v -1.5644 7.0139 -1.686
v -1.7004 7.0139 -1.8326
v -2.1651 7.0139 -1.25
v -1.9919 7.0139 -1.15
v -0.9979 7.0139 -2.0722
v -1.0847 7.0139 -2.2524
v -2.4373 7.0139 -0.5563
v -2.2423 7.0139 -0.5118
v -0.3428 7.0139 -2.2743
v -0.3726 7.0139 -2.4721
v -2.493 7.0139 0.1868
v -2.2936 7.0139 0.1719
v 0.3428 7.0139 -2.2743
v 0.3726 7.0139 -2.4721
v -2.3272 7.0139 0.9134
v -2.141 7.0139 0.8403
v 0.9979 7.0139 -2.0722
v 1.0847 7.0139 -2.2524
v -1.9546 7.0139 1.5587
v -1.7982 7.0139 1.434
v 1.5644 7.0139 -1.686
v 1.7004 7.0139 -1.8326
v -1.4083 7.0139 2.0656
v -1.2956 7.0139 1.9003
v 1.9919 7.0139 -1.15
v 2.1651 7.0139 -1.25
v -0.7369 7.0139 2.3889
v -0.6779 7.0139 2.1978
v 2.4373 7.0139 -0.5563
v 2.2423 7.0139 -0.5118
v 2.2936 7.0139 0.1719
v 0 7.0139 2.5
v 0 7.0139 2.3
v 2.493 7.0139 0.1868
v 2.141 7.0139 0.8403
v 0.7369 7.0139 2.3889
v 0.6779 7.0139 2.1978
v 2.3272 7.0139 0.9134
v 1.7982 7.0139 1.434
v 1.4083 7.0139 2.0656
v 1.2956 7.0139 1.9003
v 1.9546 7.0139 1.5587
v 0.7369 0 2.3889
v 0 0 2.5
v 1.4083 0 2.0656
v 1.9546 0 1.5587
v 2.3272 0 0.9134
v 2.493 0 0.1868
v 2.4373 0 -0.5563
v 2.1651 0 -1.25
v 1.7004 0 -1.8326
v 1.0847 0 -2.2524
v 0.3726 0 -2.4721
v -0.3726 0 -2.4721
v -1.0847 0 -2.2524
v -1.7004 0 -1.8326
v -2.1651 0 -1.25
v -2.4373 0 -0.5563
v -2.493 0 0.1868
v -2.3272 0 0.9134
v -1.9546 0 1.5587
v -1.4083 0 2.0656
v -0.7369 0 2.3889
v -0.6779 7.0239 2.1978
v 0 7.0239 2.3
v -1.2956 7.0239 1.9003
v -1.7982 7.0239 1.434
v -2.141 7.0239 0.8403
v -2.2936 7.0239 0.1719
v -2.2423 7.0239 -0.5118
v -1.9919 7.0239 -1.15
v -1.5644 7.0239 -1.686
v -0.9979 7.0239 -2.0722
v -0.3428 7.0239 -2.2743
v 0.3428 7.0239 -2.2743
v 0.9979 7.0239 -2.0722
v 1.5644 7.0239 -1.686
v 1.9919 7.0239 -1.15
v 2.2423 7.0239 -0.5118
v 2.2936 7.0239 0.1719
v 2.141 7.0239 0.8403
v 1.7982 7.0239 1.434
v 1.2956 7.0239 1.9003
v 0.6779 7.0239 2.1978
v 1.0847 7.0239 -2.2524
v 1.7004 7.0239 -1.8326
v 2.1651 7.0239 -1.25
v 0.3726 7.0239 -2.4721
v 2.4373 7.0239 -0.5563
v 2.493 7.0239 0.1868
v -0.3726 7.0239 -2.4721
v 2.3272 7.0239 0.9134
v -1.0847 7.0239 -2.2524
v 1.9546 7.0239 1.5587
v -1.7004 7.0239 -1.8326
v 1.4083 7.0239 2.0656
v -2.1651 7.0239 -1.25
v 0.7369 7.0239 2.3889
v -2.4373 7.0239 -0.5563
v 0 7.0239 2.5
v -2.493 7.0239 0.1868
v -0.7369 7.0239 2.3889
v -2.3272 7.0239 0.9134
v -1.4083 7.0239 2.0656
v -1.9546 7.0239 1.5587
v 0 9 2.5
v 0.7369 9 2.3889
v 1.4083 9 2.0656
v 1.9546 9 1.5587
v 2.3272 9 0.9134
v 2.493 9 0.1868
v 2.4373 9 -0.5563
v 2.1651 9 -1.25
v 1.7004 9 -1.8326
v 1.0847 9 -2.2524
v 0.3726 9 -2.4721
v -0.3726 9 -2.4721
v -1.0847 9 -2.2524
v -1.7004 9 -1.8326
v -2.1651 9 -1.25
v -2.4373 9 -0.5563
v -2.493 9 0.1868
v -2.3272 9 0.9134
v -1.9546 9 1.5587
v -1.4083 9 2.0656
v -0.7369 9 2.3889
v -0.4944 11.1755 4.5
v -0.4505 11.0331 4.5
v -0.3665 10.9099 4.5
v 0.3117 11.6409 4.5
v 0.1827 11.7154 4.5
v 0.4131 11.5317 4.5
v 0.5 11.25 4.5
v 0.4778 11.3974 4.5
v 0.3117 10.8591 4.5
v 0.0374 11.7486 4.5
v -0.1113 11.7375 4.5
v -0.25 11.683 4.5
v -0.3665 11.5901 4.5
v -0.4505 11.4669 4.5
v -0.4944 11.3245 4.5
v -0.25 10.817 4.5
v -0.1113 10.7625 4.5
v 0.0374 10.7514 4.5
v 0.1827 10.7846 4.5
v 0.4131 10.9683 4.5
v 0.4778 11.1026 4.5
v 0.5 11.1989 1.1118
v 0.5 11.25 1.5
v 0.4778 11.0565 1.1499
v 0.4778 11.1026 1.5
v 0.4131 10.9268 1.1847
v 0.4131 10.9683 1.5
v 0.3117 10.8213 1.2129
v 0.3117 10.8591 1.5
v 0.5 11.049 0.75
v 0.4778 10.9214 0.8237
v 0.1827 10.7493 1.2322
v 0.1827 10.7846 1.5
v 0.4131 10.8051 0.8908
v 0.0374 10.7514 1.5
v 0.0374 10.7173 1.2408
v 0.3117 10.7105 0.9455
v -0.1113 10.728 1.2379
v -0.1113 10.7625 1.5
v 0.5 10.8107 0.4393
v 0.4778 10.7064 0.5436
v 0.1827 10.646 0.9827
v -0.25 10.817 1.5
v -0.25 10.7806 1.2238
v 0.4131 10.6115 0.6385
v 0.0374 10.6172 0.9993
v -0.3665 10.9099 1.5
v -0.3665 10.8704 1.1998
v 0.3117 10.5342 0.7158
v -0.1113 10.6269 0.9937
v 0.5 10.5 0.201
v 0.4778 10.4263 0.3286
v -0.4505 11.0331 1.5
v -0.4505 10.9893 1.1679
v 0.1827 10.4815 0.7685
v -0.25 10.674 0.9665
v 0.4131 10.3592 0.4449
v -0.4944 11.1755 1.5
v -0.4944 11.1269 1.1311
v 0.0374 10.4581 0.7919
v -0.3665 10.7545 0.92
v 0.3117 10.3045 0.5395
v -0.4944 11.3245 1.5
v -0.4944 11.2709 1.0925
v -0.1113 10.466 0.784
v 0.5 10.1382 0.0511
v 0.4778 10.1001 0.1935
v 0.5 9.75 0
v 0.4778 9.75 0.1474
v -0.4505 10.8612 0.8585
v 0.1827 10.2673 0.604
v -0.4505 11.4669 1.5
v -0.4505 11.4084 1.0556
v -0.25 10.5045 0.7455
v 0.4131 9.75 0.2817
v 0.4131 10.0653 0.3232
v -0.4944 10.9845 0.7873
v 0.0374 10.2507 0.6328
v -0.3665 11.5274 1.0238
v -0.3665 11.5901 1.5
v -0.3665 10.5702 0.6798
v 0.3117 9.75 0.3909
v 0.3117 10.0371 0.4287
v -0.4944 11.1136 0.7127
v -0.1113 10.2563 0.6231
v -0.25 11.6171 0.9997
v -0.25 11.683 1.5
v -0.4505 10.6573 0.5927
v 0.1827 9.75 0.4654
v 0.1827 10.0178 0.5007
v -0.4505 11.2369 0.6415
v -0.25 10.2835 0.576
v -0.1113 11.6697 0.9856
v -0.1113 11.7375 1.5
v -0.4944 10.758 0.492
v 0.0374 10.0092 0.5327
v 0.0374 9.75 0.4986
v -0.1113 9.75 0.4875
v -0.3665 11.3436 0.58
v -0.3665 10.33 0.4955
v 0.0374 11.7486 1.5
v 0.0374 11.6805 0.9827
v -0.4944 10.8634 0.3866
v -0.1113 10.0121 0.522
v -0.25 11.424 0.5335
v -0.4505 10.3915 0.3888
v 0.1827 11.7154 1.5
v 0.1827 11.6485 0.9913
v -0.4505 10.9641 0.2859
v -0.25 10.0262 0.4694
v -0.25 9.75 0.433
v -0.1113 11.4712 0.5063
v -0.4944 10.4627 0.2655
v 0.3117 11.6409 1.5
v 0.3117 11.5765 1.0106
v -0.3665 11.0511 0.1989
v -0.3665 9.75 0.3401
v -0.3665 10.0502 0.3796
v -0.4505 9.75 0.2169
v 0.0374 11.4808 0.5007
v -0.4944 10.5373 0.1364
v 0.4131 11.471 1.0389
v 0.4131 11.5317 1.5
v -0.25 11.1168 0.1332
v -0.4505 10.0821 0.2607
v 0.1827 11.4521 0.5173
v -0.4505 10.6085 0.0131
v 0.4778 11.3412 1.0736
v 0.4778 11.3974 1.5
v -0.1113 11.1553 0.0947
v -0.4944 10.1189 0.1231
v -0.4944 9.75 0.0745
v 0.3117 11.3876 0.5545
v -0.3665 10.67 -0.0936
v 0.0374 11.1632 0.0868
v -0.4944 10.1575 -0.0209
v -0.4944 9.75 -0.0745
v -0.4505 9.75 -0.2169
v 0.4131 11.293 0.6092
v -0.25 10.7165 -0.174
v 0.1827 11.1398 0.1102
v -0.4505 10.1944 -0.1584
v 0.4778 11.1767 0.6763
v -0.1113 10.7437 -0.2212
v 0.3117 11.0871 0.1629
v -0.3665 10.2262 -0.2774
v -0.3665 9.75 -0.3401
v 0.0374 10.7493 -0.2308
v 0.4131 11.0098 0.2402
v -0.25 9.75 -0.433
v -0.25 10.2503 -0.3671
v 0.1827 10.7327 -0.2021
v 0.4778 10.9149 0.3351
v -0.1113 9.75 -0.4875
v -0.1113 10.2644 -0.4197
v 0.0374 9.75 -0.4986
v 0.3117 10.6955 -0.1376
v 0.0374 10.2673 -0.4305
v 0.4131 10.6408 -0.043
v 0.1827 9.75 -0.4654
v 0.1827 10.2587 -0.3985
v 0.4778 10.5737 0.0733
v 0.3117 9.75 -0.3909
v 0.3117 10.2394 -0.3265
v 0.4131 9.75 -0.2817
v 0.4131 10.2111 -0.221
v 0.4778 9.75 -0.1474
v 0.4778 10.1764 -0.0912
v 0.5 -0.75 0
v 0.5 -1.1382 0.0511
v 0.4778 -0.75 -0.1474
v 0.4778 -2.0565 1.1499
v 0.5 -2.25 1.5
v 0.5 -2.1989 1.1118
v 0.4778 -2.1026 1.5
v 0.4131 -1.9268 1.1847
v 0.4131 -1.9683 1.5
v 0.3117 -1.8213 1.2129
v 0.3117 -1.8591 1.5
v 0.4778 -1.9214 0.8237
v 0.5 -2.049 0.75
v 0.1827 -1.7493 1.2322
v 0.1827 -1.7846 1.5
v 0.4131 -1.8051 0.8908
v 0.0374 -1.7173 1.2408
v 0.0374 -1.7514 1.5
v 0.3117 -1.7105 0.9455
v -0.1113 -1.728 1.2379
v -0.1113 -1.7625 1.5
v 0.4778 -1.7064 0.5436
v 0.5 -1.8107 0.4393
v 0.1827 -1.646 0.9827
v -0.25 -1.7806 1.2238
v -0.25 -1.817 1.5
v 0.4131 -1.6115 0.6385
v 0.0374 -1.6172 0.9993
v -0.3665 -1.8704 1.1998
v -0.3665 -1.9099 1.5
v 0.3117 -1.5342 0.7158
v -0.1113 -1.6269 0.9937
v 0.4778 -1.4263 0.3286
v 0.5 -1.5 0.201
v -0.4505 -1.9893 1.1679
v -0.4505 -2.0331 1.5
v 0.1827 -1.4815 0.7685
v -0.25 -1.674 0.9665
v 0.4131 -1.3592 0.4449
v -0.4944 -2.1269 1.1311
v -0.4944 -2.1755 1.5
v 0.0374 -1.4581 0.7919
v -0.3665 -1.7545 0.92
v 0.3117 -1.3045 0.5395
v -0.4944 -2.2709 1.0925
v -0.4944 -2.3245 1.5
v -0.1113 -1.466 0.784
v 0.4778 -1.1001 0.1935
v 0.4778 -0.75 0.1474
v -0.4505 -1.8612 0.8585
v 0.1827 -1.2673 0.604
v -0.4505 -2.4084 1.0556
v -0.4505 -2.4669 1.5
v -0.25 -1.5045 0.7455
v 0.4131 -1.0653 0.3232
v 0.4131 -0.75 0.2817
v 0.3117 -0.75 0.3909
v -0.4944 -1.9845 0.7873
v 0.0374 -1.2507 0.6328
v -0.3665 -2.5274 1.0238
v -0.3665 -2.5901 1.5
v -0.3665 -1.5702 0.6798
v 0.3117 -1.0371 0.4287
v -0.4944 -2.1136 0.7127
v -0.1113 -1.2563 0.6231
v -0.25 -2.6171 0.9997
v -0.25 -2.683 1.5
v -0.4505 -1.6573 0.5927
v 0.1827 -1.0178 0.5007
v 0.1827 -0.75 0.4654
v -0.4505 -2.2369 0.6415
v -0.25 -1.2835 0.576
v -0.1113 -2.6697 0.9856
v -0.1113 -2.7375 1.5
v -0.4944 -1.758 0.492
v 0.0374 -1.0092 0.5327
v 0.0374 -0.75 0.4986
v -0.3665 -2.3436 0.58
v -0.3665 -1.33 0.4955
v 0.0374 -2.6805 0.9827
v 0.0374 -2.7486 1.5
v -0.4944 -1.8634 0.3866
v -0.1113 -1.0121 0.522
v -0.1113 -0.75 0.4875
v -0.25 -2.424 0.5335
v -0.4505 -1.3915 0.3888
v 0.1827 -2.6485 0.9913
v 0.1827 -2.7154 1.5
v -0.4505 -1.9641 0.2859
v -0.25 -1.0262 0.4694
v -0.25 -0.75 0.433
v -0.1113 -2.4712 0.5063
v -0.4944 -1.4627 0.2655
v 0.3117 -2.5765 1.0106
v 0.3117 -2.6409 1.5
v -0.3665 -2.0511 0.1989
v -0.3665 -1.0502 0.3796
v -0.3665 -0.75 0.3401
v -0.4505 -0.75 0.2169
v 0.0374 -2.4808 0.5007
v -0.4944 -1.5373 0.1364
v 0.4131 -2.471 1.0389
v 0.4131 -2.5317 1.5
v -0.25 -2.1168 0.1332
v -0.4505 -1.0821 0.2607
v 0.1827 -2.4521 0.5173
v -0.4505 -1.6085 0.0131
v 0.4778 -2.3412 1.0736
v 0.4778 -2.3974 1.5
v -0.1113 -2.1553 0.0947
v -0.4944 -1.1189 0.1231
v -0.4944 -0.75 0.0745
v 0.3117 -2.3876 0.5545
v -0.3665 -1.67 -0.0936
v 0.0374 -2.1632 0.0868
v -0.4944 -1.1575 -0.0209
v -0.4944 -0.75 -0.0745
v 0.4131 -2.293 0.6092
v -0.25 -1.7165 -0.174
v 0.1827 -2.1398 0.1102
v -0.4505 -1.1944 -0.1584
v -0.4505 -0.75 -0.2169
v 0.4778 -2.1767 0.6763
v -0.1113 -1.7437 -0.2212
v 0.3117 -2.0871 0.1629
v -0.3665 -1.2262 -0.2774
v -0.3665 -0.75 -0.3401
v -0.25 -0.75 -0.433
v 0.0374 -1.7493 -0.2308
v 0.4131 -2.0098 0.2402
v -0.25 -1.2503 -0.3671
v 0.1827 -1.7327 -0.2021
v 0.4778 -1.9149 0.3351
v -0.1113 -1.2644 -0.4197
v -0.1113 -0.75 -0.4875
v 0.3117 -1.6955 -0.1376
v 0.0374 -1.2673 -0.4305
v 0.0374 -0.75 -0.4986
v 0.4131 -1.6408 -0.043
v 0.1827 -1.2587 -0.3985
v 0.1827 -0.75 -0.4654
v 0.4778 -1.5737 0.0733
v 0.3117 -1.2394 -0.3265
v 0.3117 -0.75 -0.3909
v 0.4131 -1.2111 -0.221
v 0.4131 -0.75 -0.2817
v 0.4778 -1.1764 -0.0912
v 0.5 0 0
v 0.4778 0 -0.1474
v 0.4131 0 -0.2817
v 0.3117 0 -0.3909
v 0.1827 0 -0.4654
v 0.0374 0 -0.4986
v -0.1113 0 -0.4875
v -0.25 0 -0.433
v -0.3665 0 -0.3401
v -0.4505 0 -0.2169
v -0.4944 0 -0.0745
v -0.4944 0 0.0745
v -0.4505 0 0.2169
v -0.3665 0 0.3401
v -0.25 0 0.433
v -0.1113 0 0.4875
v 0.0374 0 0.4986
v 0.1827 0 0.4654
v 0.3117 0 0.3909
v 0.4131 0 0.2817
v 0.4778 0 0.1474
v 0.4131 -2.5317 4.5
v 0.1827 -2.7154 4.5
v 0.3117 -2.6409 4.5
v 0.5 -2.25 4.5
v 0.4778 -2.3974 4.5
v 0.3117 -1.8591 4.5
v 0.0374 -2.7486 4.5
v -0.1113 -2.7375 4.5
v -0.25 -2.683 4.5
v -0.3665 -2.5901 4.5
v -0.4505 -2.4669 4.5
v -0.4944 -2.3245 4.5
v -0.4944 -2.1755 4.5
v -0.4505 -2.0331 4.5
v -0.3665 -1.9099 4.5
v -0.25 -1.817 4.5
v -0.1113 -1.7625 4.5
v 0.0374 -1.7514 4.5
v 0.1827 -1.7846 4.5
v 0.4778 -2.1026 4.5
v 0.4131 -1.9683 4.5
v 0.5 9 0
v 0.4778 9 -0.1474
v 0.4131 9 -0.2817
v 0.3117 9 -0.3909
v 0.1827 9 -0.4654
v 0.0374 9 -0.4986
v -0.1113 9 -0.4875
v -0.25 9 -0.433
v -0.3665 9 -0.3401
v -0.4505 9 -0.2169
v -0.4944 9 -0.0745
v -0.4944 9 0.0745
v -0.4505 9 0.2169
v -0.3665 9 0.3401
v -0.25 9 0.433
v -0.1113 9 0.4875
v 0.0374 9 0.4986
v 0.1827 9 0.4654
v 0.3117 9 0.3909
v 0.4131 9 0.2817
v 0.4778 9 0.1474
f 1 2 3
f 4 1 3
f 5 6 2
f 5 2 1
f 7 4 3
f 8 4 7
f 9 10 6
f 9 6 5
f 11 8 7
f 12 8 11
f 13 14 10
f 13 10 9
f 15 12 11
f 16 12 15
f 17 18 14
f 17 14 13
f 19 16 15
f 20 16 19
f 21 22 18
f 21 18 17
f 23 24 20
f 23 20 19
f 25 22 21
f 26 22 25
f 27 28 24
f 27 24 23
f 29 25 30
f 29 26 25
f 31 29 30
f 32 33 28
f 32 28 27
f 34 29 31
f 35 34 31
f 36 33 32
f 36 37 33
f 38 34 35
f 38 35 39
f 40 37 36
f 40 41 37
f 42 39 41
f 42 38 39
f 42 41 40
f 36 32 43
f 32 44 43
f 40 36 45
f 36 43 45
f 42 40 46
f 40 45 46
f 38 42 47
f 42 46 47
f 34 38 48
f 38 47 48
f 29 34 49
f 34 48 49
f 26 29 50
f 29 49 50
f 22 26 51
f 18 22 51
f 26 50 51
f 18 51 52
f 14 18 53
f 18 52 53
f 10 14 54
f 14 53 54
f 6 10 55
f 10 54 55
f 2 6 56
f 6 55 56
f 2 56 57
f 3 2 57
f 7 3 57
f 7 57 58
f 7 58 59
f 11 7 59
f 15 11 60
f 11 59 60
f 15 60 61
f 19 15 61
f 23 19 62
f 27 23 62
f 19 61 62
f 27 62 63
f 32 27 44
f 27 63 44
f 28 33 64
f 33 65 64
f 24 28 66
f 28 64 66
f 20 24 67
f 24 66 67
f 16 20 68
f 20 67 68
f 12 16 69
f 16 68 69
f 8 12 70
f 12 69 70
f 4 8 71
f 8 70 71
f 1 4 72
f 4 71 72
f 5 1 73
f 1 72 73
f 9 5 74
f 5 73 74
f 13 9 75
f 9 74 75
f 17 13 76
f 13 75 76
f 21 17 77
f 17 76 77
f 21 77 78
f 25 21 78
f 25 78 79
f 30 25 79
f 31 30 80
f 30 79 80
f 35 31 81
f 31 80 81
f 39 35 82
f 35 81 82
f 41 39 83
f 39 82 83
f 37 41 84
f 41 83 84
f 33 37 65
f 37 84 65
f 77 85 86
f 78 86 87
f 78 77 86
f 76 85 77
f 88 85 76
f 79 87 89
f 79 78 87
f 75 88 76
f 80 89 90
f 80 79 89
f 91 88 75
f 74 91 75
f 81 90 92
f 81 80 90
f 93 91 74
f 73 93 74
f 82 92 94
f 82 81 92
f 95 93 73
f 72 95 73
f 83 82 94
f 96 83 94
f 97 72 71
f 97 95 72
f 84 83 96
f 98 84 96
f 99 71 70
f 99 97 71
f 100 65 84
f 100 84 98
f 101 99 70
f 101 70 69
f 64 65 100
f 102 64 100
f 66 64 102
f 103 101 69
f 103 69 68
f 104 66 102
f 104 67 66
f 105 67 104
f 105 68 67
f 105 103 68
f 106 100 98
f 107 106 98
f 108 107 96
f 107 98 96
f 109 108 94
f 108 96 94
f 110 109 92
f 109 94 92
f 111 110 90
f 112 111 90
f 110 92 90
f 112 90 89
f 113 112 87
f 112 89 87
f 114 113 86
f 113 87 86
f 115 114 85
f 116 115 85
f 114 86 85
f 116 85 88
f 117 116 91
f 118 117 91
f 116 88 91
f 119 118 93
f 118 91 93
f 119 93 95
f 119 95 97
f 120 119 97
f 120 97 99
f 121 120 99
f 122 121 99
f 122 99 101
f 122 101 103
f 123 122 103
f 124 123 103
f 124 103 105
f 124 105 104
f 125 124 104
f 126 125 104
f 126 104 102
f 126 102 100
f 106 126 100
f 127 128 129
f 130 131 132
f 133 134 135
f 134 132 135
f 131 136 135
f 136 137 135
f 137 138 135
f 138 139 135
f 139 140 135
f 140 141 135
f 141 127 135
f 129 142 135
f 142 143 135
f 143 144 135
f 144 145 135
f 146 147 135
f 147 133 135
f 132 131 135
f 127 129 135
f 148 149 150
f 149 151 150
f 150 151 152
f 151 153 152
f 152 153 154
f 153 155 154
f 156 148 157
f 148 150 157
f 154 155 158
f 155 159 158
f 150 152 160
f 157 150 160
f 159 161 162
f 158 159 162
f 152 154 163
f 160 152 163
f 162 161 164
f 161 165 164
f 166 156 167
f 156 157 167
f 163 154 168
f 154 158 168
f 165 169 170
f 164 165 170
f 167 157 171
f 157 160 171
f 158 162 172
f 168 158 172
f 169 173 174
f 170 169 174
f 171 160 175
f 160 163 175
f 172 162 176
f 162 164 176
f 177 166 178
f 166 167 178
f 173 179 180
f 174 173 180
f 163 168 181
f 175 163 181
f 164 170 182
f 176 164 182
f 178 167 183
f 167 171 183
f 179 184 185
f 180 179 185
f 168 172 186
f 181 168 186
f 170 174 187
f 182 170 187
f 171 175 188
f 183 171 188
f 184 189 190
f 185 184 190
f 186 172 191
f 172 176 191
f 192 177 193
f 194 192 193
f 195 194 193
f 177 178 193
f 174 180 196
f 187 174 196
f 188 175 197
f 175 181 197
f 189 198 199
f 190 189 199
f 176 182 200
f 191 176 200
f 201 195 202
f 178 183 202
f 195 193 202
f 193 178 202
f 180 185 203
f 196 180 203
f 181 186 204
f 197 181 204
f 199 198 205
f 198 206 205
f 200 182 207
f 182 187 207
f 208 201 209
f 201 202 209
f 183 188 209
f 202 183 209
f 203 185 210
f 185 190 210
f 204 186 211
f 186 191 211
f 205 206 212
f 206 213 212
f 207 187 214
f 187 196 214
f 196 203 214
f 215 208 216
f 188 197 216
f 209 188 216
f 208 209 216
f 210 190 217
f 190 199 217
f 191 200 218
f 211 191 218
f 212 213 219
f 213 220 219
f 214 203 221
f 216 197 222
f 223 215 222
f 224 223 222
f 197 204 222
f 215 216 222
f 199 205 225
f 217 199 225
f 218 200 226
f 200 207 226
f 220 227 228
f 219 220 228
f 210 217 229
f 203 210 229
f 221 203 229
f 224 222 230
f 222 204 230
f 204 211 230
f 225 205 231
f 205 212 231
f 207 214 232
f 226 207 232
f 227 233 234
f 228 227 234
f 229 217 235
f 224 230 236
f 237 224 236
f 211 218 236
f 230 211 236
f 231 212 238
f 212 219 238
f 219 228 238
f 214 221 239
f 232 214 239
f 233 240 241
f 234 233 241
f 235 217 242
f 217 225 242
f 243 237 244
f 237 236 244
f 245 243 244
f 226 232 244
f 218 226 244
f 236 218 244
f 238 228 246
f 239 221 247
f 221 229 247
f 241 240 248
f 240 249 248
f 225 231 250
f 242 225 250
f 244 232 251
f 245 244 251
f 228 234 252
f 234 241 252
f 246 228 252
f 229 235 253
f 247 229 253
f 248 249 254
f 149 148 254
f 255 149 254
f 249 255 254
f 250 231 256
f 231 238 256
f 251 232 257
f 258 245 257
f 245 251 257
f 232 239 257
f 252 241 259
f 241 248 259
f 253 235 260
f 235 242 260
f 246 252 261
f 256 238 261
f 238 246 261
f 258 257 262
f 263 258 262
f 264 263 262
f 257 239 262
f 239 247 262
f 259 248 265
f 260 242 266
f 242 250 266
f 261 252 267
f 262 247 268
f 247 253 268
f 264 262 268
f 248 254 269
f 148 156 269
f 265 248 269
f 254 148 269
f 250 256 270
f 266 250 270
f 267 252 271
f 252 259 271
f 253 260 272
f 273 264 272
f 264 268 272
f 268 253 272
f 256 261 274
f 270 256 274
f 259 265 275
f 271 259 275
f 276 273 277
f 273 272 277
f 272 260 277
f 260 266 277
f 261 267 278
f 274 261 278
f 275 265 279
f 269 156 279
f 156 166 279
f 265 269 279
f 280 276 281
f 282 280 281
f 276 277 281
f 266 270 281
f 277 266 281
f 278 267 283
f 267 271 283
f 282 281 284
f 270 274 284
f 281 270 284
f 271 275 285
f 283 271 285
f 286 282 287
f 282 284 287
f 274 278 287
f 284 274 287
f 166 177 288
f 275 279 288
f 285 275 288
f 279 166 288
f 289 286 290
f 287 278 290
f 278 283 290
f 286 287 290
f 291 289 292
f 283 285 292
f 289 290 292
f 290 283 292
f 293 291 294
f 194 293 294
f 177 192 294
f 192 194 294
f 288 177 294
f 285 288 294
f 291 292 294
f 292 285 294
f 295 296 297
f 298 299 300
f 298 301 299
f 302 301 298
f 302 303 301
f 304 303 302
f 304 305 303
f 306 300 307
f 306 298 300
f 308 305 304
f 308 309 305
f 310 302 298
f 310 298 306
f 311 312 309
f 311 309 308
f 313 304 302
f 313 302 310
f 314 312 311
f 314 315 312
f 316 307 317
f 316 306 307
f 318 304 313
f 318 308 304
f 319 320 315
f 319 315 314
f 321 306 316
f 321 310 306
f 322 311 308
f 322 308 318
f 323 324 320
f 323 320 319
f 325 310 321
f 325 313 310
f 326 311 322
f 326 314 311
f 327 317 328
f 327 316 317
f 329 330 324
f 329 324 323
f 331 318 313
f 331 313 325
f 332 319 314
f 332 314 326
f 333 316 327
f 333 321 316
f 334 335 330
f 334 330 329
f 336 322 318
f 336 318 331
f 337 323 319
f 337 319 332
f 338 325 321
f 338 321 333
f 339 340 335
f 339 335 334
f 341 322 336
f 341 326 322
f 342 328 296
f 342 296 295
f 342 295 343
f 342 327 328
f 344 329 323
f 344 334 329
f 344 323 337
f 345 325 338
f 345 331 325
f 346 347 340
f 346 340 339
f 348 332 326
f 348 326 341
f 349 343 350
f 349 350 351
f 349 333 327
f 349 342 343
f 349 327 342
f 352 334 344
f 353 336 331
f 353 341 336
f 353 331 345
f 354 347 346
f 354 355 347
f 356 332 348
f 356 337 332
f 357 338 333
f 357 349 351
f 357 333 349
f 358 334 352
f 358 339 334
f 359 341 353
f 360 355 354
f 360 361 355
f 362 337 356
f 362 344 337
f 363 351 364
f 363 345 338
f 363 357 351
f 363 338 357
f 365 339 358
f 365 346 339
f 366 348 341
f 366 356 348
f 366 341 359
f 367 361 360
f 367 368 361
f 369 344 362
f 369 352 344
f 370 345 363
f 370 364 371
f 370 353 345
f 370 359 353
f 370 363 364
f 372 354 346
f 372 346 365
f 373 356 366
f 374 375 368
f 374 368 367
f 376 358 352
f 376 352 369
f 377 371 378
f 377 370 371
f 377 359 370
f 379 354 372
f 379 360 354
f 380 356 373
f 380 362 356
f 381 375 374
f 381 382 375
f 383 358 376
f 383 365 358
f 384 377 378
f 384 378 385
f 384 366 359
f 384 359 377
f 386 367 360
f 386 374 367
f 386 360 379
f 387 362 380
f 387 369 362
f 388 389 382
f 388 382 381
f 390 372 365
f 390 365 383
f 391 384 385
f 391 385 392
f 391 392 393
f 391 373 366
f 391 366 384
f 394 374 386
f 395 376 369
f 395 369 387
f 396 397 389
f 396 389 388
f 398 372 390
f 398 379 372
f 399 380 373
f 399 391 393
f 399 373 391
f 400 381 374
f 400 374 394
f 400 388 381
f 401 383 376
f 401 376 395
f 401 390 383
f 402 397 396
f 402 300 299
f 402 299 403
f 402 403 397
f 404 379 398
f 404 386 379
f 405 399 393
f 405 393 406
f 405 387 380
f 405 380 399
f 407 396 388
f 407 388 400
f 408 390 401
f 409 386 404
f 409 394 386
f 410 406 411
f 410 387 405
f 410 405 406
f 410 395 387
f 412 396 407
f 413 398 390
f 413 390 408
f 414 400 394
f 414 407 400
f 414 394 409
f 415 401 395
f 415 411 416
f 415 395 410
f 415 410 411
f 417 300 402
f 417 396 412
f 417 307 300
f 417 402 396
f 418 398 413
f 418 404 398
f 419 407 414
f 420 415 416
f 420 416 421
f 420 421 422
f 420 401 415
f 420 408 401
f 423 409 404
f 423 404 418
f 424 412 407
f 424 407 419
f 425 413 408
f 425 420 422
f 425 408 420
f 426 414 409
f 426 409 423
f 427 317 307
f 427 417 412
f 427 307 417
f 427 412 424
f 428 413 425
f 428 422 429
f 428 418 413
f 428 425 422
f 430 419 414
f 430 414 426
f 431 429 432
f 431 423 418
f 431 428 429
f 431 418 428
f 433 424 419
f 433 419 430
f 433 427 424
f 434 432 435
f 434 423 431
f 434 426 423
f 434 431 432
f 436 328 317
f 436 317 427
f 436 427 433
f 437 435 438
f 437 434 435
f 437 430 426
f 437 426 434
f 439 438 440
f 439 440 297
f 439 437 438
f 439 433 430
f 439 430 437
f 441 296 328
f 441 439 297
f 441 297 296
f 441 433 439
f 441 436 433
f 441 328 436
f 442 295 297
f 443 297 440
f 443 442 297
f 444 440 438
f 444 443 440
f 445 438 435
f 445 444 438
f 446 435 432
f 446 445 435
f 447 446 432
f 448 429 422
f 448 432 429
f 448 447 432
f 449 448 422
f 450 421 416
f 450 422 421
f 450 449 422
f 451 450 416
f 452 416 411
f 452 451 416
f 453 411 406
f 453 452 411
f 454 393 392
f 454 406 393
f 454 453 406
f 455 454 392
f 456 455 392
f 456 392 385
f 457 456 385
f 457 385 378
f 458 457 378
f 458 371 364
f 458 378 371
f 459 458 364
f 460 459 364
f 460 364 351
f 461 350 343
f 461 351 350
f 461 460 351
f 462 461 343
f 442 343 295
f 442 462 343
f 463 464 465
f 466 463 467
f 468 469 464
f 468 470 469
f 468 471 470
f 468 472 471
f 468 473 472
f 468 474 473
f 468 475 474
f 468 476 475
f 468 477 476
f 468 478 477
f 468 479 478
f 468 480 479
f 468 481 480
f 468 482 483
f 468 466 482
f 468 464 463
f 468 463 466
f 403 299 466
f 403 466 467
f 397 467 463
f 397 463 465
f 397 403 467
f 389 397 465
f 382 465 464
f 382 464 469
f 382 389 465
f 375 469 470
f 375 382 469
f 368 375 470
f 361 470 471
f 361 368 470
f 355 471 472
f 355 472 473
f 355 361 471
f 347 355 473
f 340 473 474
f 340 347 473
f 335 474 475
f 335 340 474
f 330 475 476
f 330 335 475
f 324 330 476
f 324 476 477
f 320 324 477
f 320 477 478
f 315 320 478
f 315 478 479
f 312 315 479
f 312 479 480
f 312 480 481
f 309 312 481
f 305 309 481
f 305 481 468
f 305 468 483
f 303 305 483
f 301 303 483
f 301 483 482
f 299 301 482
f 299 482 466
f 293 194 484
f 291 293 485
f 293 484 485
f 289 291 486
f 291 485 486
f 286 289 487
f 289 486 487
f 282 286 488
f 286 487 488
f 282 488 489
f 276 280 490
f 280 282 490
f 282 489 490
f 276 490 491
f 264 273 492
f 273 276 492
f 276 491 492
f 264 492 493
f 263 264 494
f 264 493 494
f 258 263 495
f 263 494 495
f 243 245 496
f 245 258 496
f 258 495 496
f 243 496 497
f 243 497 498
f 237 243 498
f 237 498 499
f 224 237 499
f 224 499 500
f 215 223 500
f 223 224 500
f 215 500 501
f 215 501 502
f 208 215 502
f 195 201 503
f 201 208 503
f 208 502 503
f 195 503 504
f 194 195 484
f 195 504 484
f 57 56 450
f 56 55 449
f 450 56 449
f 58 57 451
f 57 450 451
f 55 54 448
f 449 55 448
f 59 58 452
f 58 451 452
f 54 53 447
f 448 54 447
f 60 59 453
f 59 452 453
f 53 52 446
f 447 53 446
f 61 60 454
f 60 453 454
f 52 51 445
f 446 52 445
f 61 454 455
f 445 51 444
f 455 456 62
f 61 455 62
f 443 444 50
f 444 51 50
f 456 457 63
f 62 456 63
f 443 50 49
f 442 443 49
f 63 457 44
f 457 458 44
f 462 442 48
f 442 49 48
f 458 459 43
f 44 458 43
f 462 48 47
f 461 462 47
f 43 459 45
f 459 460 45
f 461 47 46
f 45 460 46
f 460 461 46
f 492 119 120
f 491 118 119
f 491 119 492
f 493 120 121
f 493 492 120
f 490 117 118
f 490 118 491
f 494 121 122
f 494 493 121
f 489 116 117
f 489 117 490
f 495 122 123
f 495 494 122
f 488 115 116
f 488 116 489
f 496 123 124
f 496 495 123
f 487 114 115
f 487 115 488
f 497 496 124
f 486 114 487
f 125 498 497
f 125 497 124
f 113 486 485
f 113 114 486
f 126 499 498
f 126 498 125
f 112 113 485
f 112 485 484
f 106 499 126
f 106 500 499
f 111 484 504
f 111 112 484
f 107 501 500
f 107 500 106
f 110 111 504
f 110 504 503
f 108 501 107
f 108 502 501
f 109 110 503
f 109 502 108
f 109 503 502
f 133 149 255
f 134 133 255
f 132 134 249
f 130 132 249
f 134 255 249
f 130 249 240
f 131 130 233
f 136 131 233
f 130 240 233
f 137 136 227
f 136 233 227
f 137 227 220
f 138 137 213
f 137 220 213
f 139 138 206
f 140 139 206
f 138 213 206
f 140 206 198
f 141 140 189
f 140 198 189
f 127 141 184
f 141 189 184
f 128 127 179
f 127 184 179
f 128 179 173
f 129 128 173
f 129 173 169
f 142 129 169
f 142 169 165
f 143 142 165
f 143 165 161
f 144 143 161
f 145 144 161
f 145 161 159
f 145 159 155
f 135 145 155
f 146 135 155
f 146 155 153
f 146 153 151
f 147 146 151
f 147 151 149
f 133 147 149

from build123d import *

# Parameters (mm, degrees)
SKETCH_1_R      = 2.5
EXTRUDE_1_DEPTH = 9
SKETCH_4_W      = 1.07639592
SKETCH_4_H      = 0.25
SKETCH_5_R      = 2.5
EXTRUDE_3_DEPTH = 0.24
SKETCH_6_R      = 0.5


with BuildPart() as part:
    # 草图1 → 凸台-拉伸1 (new body)
    with BuildSketch(Plane(origin=(0, 0, 0), x_dir=(1, 0, 0), z_dir=(0, 1, 0))):
        with Locations(Location((0, 0, 0), (0, 0, 270))):
            Circle(SKETCH_1_R)
    extrude(amount=EXTRUDE_1_DEPTH)

    # 草图4 → 切除-旋转1 (revolve, cut)
    with BuildSketch(Plane.XY, mode=Mode.PRIVATE) as cut_revolve_1_sk:
        with Locations((-2.83819796, 6.898899293)):
            Rectangle(SKETCH_4_W, SKETCH_4_H)
    revolve(cut_revolve_1_sk.sketch.rotate(Axis((0, 9.45, 0), (0, -1, 0)), 270), axis=Axis((0, 9.45, 0), (0, -1, 0)), mode=Mode.SUBTRACT)

    # 草图5 → 凸台-拉伸3 (add)
    with BuildSketch(Plane(origin=(0, 6.773899293, 0), x_dir=(1, 0, 0), z_dir=(0, 1, 0))):
        with Locations(Location((0, 0, 0), (0, 0, 270))):
            Circle(SKETCH_5_R)
    extrude(amount=EXTRUDE_3_DEPTH)

    # 扫描1: sweep along a path in 草图7
    with BuildLine(Plane(origin=(0, 0, 0), x_dir=(0, 0, -1), z_dir=(1, 0, 0))) as sweep_1_path:
        Line((-4.5, -2.75), (-1.5, -2.75))
        ThreePointArc((-1.5, -2.75), (-0.085786438, -2.164213562), (0.5, -0.75))
        Line((0.5, -0.75), (0.5, 0))
    # 草图6 → 扫描1 (sweep)
    with BuildSketch(Plane.XZ):
        Circle(SKETCH_6_R)
    sweep_1 = sweep(path=sweep_1_path.line)

    # 镜向1: 扫描1 across plane
    add(sweep_1.mirror(Plane.ZX.offset(4.5)))


solid = part.part
